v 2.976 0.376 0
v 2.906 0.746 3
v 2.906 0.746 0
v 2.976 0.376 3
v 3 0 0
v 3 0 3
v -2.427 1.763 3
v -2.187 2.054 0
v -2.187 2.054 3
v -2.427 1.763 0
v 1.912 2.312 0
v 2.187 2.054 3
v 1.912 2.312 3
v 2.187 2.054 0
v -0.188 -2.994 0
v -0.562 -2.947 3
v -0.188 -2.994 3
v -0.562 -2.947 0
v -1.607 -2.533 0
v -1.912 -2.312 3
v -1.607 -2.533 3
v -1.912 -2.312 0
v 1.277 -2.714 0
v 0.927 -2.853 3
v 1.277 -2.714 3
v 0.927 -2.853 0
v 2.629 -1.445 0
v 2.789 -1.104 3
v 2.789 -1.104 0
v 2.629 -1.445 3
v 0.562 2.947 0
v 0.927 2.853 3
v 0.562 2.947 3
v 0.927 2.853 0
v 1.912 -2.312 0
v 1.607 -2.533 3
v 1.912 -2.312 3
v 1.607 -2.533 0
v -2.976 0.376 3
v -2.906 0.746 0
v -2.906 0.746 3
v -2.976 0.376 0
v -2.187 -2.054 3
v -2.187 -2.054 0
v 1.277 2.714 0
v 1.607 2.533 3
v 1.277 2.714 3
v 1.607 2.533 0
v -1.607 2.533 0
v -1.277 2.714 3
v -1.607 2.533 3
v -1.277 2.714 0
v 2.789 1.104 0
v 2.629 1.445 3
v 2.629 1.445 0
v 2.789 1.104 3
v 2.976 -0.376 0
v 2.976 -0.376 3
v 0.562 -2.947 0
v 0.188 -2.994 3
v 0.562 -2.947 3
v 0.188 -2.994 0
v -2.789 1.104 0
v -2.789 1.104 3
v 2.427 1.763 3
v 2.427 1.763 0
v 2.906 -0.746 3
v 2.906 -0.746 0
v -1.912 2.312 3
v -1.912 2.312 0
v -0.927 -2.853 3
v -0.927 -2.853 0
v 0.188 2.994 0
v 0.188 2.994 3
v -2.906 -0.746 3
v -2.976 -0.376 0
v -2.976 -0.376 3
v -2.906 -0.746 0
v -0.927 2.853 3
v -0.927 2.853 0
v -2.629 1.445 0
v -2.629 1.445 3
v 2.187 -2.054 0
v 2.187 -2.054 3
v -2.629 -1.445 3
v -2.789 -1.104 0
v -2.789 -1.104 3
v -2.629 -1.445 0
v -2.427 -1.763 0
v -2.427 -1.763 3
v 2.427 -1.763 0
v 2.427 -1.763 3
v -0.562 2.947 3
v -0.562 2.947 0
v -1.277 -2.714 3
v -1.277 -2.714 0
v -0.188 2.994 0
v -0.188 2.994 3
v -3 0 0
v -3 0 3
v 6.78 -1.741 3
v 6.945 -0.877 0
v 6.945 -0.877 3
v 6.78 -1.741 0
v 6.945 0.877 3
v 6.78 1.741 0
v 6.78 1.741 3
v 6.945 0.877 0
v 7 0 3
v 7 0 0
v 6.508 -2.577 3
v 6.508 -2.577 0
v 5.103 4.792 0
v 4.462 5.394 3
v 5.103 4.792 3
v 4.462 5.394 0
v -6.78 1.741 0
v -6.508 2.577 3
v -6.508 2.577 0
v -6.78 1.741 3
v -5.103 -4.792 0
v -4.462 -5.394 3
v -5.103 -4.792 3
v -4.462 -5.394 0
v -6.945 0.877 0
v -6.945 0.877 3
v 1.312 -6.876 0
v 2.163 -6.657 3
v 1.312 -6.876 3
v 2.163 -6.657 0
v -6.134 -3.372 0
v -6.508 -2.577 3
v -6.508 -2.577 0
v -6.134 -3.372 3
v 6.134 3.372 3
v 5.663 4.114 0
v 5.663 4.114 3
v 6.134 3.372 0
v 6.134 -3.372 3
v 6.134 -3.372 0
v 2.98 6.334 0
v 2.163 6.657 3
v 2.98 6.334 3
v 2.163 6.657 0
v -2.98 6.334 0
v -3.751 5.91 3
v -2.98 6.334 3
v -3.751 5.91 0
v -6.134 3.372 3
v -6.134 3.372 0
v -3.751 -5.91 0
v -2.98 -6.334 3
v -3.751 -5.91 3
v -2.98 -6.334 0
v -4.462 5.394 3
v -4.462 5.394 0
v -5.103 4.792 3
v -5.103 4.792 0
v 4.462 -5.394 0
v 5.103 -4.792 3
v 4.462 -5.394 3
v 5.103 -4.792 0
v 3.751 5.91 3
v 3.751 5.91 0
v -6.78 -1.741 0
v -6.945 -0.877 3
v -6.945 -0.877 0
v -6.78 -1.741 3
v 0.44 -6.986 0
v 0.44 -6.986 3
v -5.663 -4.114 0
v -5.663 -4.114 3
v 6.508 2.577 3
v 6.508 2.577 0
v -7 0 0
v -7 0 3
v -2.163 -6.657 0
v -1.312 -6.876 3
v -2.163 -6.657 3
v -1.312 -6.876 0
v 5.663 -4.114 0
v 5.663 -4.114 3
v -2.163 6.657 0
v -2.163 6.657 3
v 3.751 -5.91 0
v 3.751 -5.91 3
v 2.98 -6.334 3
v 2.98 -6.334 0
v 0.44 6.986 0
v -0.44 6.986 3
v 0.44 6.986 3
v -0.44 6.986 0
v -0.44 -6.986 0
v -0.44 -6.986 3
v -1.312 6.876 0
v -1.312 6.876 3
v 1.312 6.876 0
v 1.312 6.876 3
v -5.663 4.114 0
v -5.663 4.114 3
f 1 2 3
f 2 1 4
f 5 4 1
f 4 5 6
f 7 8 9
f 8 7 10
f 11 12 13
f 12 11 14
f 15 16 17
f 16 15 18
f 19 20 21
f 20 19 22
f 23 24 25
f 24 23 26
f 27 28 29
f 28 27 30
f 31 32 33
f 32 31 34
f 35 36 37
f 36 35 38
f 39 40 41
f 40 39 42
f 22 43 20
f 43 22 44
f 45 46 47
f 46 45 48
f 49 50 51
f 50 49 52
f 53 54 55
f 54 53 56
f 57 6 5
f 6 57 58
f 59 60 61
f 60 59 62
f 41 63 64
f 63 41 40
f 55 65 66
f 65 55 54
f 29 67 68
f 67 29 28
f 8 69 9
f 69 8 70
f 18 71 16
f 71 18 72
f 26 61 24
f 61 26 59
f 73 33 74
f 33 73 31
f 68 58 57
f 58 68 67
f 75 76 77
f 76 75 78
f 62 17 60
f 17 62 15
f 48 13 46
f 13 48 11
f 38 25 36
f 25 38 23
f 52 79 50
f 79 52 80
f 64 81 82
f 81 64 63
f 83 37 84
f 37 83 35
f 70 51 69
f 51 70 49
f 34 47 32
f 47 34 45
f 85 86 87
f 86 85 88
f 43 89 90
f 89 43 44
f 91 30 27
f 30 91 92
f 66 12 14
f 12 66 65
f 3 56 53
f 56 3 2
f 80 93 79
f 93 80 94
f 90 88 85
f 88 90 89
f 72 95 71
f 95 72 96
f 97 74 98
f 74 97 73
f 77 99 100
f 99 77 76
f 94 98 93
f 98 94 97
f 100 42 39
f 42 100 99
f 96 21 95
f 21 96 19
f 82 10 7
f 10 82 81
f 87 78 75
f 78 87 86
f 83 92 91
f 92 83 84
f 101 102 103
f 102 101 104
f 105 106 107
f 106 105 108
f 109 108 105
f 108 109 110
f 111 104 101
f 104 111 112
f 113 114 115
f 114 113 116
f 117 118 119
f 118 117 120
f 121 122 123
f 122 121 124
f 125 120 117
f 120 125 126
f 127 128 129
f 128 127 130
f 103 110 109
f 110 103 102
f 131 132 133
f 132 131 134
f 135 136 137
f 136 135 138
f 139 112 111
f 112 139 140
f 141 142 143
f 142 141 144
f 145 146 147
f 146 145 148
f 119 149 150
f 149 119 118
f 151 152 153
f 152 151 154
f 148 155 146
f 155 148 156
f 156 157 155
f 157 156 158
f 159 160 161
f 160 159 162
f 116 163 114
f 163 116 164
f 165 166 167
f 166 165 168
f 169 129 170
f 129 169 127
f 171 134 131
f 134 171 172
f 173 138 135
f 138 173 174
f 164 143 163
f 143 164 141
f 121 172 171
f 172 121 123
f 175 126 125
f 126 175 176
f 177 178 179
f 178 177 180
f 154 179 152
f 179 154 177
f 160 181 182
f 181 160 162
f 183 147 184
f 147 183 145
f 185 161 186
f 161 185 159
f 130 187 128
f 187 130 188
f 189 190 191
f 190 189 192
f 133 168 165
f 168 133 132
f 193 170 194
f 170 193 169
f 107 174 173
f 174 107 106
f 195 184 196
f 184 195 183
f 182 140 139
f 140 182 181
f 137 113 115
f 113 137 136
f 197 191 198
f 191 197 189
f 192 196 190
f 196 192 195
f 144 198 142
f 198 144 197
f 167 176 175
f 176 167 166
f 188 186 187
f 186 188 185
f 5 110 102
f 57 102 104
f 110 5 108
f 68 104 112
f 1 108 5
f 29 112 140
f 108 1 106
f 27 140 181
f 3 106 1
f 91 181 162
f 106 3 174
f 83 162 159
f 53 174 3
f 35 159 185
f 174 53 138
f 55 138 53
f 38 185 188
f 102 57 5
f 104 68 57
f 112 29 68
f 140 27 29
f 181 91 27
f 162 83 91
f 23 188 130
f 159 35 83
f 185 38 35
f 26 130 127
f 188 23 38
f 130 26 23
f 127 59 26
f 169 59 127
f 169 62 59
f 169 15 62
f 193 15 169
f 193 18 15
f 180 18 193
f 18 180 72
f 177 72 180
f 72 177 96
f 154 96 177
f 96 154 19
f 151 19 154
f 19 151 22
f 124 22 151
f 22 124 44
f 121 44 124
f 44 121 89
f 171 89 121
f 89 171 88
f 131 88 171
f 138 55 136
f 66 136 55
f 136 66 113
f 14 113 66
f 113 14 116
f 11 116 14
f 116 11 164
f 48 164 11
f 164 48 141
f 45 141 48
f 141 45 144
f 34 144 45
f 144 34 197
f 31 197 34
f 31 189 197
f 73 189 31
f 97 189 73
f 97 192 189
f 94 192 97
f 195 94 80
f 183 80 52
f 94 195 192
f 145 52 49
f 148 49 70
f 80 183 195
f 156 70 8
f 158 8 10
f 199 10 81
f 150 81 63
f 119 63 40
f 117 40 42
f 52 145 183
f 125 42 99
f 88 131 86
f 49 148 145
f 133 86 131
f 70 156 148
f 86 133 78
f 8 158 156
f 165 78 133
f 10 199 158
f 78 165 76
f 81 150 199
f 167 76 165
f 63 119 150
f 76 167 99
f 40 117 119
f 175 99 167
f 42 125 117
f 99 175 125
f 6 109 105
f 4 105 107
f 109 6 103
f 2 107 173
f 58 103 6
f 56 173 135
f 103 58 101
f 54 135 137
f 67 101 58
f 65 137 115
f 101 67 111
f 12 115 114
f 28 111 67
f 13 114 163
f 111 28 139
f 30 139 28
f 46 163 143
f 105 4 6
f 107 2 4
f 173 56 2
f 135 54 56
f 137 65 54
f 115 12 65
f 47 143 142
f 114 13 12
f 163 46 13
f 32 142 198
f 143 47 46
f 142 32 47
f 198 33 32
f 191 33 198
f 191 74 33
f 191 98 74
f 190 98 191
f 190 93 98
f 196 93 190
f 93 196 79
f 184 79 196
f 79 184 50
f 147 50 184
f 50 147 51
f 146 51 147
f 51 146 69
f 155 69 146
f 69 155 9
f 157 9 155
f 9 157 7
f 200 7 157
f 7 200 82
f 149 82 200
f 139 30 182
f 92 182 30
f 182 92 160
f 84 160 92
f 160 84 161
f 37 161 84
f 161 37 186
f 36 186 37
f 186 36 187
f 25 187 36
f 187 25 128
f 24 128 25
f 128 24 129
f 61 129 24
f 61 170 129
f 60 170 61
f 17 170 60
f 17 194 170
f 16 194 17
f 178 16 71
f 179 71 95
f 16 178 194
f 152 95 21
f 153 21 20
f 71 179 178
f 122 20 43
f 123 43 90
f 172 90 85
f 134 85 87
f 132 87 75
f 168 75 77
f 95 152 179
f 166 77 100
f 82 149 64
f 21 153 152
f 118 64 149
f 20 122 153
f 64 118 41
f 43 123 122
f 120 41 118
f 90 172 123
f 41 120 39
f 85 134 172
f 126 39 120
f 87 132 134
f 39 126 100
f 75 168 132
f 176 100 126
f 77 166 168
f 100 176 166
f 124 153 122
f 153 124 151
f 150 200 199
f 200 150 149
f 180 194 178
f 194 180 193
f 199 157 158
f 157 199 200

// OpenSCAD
$fn = 50;


difference() {
	union() {
		cylinder(h = 3, r = 7.0000000000);
	}
	union() {
		translate(v = [0.0000000000, 0.0000000000, -100.0000000000]) {
			cylinder(h = 200, r = 3.0000000000);
		}
		cylinder(h = 3, r = 1.5000000000);
		cylinder(h = 3, r = 1.5000000000);
		cylinder(h = 3, r = 1.5000000000);
	}
}
